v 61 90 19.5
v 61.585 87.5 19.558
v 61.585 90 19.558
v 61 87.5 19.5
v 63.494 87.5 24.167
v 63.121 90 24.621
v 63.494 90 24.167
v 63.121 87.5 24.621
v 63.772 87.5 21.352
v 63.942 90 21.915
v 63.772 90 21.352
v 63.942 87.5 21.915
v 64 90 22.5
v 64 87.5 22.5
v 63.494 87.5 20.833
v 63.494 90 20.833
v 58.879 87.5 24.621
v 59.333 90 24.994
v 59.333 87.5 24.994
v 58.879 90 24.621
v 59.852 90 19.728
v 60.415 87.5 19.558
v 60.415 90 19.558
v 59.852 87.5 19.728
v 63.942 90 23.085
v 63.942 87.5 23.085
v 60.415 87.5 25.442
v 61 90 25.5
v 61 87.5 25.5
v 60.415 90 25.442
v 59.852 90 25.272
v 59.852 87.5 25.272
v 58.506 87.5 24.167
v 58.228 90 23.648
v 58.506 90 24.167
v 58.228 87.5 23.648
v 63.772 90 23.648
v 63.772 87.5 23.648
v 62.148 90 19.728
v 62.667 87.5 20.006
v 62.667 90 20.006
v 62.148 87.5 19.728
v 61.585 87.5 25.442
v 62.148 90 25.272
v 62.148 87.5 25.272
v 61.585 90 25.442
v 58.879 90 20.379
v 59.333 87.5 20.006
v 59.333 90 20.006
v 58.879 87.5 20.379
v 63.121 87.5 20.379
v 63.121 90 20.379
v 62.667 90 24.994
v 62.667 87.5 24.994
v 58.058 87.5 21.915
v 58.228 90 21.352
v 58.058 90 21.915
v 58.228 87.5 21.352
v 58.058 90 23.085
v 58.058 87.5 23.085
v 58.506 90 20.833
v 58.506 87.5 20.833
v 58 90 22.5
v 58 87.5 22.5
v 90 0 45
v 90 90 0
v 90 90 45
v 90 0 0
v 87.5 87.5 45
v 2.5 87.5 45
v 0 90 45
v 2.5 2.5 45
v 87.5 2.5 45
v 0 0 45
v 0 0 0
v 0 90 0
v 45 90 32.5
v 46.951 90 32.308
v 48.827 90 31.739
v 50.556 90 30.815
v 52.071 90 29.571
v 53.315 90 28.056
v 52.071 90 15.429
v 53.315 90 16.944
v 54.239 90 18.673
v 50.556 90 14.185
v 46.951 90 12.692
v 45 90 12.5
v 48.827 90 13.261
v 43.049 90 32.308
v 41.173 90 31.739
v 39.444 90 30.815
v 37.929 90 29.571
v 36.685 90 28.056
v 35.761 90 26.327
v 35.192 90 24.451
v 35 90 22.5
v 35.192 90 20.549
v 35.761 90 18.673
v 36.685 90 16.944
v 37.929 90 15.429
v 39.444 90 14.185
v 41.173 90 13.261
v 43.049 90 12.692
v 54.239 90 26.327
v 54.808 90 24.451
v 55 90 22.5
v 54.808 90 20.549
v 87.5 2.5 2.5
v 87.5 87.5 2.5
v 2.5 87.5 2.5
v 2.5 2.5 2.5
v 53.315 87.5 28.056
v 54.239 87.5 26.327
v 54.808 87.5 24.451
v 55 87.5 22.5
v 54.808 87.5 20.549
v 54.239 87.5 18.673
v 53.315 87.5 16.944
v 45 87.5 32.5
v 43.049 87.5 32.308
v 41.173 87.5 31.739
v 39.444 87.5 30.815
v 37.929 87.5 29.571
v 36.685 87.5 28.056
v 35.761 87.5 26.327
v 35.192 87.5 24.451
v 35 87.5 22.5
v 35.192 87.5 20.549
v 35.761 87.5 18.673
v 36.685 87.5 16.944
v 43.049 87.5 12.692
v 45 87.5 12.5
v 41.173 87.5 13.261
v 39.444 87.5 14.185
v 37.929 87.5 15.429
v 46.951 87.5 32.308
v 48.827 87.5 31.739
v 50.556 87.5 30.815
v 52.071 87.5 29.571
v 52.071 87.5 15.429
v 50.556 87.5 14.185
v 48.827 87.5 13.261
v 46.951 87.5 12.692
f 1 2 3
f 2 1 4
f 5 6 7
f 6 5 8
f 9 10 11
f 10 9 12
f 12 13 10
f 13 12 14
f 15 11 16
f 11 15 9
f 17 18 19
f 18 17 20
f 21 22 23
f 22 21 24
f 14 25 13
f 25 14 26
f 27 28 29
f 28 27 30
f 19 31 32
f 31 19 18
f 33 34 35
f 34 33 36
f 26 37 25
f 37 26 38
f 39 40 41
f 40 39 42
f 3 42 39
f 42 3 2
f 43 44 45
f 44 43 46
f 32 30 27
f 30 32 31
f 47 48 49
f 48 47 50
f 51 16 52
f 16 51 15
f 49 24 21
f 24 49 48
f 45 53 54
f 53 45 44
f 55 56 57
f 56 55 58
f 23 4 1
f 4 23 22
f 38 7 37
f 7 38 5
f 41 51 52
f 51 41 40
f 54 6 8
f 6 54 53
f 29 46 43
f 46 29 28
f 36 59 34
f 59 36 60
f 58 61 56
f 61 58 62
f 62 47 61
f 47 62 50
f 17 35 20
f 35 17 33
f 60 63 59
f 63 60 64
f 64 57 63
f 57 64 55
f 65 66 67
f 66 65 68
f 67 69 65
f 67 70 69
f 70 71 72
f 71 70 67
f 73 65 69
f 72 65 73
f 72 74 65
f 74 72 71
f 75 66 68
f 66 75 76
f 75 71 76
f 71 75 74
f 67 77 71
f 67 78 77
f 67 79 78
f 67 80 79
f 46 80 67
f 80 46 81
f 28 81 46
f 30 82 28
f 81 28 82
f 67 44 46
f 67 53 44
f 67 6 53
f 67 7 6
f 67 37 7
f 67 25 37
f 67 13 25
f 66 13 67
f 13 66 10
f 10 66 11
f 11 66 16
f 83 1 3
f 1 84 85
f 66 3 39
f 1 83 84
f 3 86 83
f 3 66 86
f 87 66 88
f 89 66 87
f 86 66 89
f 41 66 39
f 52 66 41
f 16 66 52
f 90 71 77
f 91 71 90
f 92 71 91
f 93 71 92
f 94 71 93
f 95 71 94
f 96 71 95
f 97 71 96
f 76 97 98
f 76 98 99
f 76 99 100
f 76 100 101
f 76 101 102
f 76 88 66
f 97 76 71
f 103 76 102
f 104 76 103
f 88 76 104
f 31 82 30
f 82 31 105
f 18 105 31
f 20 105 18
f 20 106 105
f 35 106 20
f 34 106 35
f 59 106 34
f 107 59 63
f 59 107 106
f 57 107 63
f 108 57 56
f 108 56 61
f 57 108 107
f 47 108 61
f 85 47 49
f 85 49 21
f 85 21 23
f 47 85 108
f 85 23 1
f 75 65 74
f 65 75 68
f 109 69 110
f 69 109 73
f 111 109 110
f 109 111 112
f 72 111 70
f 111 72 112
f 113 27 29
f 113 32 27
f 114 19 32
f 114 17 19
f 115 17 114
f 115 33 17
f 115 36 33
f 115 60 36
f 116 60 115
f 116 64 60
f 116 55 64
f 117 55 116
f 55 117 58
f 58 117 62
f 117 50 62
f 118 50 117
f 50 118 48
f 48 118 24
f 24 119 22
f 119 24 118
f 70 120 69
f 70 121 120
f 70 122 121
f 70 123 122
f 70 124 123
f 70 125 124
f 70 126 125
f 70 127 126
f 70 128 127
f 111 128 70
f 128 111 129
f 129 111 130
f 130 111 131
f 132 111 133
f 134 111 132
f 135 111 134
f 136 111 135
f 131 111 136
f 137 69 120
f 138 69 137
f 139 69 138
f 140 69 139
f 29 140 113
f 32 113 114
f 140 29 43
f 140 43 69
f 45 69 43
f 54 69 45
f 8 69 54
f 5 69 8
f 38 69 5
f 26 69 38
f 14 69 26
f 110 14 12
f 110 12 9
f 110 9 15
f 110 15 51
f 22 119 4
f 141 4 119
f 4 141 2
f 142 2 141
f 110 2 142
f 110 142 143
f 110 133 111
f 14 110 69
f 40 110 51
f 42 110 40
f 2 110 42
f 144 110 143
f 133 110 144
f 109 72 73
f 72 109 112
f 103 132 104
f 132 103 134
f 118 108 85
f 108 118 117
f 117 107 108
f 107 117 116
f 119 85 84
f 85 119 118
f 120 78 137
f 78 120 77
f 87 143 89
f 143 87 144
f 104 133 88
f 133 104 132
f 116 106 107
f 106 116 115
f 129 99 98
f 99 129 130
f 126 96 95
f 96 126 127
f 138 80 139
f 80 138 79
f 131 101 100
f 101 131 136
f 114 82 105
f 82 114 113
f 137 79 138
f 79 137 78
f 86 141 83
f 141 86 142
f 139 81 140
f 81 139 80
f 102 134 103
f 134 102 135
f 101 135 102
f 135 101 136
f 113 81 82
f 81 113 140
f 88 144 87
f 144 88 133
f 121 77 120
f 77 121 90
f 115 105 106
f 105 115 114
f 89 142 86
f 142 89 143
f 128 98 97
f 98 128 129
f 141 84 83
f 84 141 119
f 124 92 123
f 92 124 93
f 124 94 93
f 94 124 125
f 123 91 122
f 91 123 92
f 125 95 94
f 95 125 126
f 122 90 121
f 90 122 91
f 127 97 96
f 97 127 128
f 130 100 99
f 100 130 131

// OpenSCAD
$fn = 32;

// ----------------------------------------------------------------------
// Vent box: roundvent enclosure
// ----------------------------------------------------------------------

// --- parameters (mm) ---
box_l = 90;               // box length, X
box_w = 90;               // box width, Y
box_h = 45;               // box height, Z
wall_t = 2.5;             // shell wall thickness
vent_d = 20;              // central vent diameter
ring_d = 6;               // ring hole diameter
n_ring = 6;               // holes in the ring
ring_r = 16;              // ring radius

ring_step = 360 / n_ring;  // ring hole angular step

difference() {
  cube([box_l, box_w, box_h]);
  translate([wall_t, wall_t, wall_t])
    cube([box_l - 2 * wall_t, box_w - 2 * wall_t, box_h]);
  translate([box_l / 2, box_w - wall_t - 1, box_h / 2])
    rotate([-90, 0, 0]) cylinder(h = wall_t + 2, d = vent_d);
  for (i = [0 : n_ring - 1])
    translate([box_l / 2, box_w - wall_t - 1, box_h / 2])
      rotate([0, 0, i * ring_step])
        translate([ring_r, 0, 0]) rotate([-90, 0, 0])
          cylinder(h = wall_t + 2, d = ring_d);
}
